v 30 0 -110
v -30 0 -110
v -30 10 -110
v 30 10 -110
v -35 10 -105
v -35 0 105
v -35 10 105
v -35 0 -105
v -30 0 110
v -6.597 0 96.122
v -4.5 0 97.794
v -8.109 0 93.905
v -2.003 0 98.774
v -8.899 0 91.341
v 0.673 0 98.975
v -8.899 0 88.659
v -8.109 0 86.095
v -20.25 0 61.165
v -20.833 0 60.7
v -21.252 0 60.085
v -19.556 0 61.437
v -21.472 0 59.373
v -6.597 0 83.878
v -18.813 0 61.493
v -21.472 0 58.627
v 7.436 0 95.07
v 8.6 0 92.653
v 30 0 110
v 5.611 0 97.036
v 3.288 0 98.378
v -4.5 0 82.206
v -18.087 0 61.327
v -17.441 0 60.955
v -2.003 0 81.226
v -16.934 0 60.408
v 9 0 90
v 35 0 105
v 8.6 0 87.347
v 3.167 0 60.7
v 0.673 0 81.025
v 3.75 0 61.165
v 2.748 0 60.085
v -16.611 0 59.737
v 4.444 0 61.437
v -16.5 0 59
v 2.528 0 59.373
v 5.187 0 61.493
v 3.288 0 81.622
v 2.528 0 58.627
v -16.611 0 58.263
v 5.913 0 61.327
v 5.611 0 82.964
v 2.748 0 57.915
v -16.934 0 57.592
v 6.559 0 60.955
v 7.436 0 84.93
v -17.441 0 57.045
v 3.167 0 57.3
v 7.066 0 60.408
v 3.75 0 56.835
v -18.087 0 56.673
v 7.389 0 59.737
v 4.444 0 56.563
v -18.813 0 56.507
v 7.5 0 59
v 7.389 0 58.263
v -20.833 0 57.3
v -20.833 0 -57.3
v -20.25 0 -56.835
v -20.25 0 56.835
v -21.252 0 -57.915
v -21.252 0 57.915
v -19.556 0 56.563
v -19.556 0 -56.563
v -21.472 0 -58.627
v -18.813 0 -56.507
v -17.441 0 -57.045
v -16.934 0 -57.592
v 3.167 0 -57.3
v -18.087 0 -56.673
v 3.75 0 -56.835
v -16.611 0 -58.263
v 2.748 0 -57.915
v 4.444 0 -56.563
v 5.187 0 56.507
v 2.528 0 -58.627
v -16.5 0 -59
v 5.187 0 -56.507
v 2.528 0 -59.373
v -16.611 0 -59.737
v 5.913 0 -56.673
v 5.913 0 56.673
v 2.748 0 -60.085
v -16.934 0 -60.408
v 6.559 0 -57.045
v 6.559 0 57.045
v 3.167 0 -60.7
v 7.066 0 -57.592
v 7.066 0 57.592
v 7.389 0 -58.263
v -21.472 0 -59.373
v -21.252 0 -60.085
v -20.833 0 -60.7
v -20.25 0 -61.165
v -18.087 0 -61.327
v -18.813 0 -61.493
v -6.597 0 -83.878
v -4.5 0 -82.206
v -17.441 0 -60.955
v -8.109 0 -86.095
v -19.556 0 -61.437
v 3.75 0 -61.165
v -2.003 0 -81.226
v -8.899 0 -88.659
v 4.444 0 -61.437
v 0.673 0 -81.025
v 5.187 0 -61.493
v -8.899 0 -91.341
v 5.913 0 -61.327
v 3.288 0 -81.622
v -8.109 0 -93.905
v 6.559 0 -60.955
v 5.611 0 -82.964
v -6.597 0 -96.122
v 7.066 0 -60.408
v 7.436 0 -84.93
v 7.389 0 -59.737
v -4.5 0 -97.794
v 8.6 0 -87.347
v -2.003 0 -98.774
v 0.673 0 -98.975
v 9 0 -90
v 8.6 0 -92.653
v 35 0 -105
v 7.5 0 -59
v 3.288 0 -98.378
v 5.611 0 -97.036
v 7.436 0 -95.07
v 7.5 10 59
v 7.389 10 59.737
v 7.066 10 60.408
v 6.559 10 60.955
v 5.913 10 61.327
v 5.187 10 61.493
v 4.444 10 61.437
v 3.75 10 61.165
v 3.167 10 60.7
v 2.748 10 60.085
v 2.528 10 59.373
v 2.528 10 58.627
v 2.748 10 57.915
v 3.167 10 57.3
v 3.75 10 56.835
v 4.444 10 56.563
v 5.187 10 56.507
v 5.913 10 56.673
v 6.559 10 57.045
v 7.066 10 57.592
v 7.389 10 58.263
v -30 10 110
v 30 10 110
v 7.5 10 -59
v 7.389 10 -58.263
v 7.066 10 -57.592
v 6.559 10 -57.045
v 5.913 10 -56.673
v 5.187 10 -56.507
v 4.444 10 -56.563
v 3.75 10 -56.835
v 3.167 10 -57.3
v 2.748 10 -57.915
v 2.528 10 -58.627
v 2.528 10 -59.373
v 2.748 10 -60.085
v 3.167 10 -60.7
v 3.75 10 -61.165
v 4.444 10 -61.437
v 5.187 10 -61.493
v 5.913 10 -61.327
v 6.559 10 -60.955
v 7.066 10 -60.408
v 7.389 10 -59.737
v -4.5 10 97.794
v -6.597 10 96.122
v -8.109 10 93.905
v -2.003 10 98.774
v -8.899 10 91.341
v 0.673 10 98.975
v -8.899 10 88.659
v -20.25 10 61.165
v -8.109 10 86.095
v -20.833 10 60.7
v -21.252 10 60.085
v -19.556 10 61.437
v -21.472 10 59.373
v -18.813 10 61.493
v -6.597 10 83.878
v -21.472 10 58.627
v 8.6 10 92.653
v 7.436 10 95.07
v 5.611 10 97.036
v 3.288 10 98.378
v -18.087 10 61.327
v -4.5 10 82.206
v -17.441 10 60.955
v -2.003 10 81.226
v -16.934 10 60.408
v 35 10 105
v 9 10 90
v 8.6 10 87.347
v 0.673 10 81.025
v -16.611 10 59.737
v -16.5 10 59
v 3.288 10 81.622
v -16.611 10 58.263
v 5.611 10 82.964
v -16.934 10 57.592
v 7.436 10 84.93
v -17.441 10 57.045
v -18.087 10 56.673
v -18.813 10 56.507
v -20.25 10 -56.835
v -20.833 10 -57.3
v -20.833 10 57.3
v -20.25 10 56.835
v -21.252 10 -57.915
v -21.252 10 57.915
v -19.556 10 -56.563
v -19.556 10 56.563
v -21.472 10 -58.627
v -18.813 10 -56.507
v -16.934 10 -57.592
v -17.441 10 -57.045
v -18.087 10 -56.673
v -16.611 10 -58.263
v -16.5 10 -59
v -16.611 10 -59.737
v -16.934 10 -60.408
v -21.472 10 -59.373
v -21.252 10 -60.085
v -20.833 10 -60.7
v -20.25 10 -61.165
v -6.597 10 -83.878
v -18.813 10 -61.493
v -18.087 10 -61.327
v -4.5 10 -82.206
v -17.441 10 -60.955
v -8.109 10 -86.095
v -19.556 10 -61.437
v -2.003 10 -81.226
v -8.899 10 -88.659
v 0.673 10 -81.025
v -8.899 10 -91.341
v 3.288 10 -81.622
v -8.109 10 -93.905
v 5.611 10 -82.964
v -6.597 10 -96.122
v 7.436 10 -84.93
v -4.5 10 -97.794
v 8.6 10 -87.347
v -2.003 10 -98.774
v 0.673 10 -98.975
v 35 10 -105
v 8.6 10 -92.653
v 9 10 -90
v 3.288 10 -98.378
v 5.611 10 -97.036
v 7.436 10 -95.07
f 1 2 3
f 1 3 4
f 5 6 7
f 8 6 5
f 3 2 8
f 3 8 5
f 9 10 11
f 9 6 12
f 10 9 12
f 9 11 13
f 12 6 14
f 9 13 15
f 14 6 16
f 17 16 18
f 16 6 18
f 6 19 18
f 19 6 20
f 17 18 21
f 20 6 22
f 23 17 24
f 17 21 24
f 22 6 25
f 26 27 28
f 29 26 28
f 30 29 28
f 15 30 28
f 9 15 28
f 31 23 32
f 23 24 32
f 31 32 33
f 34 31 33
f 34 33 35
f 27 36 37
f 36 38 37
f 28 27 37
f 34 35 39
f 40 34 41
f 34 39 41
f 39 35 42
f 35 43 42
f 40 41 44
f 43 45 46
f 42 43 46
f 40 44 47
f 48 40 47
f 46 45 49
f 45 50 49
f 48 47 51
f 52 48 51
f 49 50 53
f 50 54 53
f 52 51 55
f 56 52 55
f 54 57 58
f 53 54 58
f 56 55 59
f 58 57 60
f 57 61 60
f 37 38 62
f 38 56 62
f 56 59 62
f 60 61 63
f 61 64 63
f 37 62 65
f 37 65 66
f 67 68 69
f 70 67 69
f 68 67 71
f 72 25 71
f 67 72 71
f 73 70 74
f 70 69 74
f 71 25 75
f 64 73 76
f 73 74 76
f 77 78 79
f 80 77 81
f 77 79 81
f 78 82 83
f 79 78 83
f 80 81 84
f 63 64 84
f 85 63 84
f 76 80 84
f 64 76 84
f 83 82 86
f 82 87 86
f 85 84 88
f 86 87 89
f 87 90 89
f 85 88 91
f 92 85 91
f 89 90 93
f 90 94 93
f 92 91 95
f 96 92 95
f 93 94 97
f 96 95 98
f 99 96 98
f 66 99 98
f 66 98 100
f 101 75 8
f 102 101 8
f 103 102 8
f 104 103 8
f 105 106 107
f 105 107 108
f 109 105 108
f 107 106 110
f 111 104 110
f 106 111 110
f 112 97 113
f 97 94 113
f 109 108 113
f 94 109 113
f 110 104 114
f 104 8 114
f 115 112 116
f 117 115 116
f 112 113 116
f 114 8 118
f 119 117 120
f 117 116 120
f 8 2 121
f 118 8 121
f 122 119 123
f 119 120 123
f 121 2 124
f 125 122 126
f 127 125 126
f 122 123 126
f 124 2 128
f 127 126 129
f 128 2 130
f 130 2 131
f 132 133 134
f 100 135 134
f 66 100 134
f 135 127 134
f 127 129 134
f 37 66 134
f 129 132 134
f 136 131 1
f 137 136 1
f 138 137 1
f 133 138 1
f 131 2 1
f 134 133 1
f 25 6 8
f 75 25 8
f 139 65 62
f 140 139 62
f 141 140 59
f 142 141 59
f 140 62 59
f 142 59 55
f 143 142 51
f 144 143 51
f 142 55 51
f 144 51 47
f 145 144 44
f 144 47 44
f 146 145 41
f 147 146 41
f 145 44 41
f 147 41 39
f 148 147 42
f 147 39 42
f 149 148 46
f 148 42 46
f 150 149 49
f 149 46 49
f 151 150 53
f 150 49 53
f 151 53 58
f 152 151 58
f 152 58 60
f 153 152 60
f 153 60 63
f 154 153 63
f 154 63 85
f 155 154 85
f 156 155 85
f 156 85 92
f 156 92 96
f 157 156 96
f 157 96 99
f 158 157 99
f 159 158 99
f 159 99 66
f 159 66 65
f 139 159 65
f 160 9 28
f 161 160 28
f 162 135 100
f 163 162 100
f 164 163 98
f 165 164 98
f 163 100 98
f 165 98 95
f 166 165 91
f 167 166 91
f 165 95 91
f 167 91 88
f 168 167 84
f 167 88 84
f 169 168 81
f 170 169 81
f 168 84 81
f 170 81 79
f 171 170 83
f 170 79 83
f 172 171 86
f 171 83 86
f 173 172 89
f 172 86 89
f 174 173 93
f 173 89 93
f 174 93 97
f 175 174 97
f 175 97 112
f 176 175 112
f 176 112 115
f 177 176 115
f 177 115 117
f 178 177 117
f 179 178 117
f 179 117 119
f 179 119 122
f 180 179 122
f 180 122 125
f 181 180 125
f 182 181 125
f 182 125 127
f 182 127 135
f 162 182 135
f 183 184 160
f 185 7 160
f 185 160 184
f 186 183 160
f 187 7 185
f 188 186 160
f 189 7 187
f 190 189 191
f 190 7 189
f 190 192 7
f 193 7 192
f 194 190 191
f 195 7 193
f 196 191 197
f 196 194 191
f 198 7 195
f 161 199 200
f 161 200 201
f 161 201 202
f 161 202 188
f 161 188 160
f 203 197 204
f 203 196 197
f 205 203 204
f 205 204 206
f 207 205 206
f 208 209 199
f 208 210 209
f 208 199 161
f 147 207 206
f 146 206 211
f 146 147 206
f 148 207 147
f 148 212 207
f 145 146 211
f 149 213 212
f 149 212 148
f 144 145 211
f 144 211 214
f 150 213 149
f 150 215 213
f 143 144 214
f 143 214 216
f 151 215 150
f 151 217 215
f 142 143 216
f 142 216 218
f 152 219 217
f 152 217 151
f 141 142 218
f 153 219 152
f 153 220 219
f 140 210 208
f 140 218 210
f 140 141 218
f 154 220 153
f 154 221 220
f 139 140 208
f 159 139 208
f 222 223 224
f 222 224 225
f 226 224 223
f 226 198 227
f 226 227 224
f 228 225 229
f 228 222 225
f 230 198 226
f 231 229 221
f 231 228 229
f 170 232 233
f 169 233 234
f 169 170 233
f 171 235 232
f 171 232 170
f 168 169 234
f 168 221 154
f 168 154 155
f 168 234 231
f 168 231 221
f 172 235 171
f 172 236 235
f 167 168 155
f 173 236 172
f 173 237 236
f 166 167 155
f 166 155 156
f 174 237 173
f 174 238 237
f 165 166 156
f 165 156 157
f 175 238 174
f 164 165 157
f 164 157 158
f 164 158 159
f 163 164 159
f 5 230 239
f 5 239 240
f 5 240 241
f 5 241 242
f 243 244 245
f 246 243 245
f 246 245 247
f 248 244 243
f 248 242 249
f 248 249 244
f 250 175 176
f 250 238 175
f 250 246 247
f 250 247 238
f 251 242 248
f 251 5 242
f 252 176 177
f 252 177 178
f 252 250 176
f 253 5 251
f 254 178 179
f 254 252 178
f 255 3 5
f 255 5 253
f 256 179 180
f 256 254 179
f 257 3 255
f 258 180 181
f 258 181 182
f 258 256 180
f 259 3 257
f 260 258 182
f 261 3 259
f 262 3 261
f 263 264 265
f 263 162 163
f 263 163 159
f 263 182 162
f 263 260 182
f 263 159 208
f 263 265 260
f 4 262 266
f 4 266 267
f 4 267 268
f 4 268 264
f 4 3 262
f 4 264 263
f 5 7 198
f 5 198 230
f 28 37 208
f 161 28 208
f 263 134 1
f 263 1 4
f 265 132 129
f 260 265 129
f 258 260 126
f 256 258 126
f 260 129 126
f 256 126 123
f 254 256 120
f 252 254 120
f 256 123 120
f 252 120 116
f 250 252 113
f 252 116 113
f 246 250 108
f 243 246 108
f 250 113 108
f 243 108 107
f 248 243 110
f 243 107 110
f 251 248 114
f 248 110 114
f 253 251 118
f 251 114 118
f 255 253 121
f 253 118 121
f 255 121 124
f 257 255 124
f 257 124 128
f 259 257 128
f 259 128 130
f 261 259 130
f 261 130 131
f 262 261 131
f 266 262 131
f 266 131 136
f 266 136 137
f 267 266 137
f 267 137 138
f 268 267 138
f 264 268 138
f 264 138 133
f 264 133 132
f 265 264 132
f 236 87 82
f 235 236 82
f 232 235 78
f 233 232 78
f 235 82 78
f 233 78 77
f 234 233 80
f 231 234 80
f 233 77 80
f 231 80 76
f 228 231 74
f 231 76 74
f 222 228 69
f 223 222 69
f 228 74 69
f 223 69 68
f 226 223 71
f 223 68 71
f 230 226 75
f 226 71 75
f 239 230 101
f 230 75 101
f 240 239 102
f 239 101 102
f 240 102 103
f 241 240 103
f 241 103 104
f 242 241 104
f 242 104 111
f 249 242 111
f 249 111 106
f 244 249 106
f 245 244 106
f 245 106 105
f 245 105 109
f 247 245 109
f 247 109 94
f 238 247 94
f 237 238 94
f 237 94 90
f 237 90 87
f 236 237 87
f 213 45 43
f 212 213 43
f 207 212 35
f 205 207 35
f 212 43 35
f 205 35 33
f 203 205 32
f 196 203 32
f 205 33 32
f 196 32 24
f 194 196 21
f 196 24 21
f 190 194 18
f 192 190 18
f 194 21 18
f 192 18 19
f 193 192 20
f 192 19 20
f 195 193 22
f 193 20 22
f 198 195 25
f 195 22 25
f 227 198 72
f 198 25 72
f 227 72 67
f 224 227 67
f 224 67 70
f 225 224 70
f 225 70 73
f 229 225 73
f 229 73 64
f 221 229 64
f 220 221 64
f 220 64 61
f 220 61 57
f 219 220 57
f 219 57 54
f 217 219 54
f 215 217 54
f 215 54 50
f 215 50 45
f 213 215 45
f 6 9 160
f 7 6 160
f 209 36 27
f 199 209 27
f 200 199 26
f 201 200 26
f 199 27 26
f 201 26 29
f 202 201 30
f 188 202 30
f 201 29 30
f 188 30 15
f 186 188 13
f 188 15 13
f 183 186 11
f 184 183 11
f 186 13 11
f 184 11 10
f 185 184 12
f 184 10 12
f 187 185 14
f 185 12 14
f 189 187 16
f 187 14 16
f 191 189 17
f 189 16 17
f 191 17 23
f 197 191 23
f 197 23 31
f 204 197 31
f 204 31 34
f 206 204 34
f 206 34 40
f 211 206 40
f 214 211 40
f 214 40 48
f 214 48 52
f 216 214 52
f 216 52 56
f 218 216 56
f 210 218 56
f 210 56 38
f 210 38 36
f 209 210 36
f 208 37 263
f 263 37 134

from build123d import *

# Parameters (mm, degrees)
SKETCH_1_W              = 70
SKETCH_1_H              = 220
EXTRUDE_1_DEPTH         = 10
HOLE_WIZARD_M6_1_D      = 5
HOLE_WIZARD_18_0_18_1_D = 18
CHAMFER_1_SIZE          = 5


with BuildPart() as part:
    # 草圖1 → 伸長1 (new body)
    with BuildSketch(Plane(origin=(0, 0, 0), x_dir=(1, 0, 0), z_dir=(0, 1, 0))):
        Rectangle(SKETCH_1_W, SKETCH_1_H)
    extrude(amount=EXTRUDE_1_DEPTH)

    # M6 螺紋孔1 (through all)
    with Locations(Plane(origin=(0, 10, 0), x_dir=(-1, 0, 0), z_dir=(0, 1, 0))):
        with Locations((19, -59), (19, 59), (-5, -59), (-5, 59)):
            Hole(HOLE_WIZARD_M6_1_D / 2)

    # Ø18.0 (18) 直徑孔1 (through all)
    with Locations(Plane(origin=(0, 10, 0), x_dir=(-1, 0, 0), z_dir=(0, 1, 0))):
        with Locations((0, -90), (0, 90)):
            Hole(HOLE_WIZARD_18_0_18_1_D / 2)

    # 導角1
    chamfer_1_edges = [part.edges().sort_by_distance(p)[0] for p in [
        (-35, 5, -110),
        (35, 5, -110),
        (35, 5, 110),
        (-35, 5, 110),
    ]]
    chamfer(chamfer_1_edges, length=CHAMFER_1_SIZE)


solid = part.part
